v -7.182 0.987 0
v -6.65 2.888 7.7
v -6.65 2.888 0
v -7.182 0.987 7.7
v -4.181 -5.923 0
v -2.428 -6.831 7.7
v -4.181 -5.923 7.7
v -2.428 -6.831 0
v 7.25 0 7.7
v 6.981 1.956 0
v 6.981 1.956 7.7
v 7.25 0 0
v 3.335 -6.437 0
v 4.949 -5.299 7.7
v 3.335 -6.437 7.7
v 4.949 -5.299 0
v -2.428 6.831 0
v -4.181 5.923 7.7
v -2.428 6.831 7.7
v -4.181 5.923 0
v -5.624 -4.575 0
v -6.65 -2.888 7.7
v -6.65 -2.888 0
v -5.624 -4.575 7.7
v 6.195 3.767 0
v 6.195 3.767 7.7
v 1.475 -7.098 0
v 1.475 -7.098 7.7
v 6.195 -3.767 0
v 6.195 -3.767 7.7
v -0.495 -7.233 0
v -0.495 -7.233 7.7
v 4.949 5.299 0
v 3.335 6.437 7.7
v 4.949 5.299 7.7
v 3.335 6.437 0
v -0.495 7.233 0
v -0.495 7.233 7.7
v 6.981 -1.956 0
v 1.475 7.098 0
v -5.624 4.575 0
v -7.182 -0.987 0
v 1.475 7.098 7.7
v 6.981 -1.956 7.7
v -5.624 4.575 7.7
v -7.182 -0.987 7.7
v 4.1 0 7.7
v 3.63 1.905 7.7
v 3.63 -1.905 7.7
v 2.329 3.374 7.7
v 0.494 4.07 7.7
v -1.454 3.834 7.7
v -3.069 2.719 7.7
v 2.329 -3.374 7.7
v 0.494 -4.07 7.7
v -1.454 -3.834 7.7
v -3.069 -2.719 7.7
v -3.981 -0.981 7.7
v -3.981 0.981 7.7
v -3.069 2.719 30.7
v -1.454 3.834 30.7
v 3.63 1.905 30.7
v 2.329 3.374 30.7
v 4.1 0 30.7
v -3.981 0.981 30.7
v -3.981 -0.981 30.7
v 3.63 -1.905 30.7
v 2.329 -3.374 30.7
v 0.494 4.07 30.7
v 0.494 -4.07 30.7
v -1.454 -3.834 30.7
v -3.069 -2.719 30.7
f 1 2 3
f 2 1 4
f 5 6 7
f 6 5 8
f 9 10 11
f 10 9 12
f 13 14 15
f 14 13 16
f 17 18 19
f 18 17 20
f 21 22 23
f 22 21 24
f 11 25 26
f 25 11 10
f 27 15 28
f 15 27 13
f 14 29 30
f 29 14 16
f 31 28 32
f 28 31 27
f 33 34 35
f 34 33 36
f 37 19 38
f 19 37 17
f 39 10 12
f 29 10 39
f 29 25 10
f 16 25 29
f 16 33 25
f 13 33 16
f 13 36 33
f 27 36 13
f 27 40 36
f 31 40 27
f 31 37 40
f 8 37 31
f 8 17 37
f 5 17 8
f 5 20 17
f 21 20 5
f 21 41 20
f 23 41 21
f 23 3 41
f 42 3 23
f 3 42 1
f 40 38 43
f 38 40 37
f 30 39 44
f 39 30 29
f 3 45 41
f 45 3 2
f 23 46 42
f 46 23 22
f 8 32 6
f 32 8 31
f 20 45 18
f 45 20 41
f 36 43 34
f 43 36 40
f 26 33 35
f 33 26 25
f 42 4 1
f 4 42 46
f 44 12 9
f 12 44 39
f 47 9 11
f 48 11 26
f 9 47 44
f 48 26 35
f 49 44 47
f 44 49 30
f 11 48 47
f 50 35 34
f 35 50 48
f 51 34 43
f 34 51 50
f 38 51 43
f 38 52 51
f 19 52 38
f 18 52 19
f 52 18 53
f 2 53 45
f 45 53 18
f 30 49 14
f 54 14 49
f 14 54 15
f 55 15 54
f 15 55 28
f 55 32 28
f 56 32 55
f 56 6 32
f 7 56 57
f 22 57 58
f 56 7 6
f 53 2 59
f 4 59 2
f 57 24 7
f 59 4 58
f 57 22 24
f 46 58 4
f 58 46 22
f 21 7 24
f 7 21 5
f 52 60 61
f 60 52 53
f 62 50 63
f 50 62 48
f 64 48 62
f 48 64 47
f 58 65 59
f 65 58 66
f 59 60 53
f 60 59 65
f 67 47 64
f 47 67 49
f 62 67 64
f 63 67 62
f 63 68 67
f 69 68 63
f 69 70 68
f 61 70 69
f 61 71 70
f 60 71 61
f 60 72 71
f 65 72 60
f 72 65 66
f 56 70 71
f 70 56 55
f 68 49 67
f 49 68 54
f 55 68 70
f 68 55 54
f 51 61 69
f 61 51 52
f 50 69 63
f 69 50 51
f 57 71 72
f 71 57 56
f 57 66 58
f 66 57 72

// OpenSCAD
kop_diam = 14.5;
kop_height = 7.7;
stift_diam = 8.2;
stift_height = 23;

translate([0, 0, 0])
{
    cylinder(h = kop_height, r1 = kop_diam / 2, r2 = kop_diam / 2, center = false);
}

translate([0, 0, kop_height])
{
    cylinder(h = stift_height, r1 = stift_diam / 2, r2 = stift_diam / 2, center = false);
}
